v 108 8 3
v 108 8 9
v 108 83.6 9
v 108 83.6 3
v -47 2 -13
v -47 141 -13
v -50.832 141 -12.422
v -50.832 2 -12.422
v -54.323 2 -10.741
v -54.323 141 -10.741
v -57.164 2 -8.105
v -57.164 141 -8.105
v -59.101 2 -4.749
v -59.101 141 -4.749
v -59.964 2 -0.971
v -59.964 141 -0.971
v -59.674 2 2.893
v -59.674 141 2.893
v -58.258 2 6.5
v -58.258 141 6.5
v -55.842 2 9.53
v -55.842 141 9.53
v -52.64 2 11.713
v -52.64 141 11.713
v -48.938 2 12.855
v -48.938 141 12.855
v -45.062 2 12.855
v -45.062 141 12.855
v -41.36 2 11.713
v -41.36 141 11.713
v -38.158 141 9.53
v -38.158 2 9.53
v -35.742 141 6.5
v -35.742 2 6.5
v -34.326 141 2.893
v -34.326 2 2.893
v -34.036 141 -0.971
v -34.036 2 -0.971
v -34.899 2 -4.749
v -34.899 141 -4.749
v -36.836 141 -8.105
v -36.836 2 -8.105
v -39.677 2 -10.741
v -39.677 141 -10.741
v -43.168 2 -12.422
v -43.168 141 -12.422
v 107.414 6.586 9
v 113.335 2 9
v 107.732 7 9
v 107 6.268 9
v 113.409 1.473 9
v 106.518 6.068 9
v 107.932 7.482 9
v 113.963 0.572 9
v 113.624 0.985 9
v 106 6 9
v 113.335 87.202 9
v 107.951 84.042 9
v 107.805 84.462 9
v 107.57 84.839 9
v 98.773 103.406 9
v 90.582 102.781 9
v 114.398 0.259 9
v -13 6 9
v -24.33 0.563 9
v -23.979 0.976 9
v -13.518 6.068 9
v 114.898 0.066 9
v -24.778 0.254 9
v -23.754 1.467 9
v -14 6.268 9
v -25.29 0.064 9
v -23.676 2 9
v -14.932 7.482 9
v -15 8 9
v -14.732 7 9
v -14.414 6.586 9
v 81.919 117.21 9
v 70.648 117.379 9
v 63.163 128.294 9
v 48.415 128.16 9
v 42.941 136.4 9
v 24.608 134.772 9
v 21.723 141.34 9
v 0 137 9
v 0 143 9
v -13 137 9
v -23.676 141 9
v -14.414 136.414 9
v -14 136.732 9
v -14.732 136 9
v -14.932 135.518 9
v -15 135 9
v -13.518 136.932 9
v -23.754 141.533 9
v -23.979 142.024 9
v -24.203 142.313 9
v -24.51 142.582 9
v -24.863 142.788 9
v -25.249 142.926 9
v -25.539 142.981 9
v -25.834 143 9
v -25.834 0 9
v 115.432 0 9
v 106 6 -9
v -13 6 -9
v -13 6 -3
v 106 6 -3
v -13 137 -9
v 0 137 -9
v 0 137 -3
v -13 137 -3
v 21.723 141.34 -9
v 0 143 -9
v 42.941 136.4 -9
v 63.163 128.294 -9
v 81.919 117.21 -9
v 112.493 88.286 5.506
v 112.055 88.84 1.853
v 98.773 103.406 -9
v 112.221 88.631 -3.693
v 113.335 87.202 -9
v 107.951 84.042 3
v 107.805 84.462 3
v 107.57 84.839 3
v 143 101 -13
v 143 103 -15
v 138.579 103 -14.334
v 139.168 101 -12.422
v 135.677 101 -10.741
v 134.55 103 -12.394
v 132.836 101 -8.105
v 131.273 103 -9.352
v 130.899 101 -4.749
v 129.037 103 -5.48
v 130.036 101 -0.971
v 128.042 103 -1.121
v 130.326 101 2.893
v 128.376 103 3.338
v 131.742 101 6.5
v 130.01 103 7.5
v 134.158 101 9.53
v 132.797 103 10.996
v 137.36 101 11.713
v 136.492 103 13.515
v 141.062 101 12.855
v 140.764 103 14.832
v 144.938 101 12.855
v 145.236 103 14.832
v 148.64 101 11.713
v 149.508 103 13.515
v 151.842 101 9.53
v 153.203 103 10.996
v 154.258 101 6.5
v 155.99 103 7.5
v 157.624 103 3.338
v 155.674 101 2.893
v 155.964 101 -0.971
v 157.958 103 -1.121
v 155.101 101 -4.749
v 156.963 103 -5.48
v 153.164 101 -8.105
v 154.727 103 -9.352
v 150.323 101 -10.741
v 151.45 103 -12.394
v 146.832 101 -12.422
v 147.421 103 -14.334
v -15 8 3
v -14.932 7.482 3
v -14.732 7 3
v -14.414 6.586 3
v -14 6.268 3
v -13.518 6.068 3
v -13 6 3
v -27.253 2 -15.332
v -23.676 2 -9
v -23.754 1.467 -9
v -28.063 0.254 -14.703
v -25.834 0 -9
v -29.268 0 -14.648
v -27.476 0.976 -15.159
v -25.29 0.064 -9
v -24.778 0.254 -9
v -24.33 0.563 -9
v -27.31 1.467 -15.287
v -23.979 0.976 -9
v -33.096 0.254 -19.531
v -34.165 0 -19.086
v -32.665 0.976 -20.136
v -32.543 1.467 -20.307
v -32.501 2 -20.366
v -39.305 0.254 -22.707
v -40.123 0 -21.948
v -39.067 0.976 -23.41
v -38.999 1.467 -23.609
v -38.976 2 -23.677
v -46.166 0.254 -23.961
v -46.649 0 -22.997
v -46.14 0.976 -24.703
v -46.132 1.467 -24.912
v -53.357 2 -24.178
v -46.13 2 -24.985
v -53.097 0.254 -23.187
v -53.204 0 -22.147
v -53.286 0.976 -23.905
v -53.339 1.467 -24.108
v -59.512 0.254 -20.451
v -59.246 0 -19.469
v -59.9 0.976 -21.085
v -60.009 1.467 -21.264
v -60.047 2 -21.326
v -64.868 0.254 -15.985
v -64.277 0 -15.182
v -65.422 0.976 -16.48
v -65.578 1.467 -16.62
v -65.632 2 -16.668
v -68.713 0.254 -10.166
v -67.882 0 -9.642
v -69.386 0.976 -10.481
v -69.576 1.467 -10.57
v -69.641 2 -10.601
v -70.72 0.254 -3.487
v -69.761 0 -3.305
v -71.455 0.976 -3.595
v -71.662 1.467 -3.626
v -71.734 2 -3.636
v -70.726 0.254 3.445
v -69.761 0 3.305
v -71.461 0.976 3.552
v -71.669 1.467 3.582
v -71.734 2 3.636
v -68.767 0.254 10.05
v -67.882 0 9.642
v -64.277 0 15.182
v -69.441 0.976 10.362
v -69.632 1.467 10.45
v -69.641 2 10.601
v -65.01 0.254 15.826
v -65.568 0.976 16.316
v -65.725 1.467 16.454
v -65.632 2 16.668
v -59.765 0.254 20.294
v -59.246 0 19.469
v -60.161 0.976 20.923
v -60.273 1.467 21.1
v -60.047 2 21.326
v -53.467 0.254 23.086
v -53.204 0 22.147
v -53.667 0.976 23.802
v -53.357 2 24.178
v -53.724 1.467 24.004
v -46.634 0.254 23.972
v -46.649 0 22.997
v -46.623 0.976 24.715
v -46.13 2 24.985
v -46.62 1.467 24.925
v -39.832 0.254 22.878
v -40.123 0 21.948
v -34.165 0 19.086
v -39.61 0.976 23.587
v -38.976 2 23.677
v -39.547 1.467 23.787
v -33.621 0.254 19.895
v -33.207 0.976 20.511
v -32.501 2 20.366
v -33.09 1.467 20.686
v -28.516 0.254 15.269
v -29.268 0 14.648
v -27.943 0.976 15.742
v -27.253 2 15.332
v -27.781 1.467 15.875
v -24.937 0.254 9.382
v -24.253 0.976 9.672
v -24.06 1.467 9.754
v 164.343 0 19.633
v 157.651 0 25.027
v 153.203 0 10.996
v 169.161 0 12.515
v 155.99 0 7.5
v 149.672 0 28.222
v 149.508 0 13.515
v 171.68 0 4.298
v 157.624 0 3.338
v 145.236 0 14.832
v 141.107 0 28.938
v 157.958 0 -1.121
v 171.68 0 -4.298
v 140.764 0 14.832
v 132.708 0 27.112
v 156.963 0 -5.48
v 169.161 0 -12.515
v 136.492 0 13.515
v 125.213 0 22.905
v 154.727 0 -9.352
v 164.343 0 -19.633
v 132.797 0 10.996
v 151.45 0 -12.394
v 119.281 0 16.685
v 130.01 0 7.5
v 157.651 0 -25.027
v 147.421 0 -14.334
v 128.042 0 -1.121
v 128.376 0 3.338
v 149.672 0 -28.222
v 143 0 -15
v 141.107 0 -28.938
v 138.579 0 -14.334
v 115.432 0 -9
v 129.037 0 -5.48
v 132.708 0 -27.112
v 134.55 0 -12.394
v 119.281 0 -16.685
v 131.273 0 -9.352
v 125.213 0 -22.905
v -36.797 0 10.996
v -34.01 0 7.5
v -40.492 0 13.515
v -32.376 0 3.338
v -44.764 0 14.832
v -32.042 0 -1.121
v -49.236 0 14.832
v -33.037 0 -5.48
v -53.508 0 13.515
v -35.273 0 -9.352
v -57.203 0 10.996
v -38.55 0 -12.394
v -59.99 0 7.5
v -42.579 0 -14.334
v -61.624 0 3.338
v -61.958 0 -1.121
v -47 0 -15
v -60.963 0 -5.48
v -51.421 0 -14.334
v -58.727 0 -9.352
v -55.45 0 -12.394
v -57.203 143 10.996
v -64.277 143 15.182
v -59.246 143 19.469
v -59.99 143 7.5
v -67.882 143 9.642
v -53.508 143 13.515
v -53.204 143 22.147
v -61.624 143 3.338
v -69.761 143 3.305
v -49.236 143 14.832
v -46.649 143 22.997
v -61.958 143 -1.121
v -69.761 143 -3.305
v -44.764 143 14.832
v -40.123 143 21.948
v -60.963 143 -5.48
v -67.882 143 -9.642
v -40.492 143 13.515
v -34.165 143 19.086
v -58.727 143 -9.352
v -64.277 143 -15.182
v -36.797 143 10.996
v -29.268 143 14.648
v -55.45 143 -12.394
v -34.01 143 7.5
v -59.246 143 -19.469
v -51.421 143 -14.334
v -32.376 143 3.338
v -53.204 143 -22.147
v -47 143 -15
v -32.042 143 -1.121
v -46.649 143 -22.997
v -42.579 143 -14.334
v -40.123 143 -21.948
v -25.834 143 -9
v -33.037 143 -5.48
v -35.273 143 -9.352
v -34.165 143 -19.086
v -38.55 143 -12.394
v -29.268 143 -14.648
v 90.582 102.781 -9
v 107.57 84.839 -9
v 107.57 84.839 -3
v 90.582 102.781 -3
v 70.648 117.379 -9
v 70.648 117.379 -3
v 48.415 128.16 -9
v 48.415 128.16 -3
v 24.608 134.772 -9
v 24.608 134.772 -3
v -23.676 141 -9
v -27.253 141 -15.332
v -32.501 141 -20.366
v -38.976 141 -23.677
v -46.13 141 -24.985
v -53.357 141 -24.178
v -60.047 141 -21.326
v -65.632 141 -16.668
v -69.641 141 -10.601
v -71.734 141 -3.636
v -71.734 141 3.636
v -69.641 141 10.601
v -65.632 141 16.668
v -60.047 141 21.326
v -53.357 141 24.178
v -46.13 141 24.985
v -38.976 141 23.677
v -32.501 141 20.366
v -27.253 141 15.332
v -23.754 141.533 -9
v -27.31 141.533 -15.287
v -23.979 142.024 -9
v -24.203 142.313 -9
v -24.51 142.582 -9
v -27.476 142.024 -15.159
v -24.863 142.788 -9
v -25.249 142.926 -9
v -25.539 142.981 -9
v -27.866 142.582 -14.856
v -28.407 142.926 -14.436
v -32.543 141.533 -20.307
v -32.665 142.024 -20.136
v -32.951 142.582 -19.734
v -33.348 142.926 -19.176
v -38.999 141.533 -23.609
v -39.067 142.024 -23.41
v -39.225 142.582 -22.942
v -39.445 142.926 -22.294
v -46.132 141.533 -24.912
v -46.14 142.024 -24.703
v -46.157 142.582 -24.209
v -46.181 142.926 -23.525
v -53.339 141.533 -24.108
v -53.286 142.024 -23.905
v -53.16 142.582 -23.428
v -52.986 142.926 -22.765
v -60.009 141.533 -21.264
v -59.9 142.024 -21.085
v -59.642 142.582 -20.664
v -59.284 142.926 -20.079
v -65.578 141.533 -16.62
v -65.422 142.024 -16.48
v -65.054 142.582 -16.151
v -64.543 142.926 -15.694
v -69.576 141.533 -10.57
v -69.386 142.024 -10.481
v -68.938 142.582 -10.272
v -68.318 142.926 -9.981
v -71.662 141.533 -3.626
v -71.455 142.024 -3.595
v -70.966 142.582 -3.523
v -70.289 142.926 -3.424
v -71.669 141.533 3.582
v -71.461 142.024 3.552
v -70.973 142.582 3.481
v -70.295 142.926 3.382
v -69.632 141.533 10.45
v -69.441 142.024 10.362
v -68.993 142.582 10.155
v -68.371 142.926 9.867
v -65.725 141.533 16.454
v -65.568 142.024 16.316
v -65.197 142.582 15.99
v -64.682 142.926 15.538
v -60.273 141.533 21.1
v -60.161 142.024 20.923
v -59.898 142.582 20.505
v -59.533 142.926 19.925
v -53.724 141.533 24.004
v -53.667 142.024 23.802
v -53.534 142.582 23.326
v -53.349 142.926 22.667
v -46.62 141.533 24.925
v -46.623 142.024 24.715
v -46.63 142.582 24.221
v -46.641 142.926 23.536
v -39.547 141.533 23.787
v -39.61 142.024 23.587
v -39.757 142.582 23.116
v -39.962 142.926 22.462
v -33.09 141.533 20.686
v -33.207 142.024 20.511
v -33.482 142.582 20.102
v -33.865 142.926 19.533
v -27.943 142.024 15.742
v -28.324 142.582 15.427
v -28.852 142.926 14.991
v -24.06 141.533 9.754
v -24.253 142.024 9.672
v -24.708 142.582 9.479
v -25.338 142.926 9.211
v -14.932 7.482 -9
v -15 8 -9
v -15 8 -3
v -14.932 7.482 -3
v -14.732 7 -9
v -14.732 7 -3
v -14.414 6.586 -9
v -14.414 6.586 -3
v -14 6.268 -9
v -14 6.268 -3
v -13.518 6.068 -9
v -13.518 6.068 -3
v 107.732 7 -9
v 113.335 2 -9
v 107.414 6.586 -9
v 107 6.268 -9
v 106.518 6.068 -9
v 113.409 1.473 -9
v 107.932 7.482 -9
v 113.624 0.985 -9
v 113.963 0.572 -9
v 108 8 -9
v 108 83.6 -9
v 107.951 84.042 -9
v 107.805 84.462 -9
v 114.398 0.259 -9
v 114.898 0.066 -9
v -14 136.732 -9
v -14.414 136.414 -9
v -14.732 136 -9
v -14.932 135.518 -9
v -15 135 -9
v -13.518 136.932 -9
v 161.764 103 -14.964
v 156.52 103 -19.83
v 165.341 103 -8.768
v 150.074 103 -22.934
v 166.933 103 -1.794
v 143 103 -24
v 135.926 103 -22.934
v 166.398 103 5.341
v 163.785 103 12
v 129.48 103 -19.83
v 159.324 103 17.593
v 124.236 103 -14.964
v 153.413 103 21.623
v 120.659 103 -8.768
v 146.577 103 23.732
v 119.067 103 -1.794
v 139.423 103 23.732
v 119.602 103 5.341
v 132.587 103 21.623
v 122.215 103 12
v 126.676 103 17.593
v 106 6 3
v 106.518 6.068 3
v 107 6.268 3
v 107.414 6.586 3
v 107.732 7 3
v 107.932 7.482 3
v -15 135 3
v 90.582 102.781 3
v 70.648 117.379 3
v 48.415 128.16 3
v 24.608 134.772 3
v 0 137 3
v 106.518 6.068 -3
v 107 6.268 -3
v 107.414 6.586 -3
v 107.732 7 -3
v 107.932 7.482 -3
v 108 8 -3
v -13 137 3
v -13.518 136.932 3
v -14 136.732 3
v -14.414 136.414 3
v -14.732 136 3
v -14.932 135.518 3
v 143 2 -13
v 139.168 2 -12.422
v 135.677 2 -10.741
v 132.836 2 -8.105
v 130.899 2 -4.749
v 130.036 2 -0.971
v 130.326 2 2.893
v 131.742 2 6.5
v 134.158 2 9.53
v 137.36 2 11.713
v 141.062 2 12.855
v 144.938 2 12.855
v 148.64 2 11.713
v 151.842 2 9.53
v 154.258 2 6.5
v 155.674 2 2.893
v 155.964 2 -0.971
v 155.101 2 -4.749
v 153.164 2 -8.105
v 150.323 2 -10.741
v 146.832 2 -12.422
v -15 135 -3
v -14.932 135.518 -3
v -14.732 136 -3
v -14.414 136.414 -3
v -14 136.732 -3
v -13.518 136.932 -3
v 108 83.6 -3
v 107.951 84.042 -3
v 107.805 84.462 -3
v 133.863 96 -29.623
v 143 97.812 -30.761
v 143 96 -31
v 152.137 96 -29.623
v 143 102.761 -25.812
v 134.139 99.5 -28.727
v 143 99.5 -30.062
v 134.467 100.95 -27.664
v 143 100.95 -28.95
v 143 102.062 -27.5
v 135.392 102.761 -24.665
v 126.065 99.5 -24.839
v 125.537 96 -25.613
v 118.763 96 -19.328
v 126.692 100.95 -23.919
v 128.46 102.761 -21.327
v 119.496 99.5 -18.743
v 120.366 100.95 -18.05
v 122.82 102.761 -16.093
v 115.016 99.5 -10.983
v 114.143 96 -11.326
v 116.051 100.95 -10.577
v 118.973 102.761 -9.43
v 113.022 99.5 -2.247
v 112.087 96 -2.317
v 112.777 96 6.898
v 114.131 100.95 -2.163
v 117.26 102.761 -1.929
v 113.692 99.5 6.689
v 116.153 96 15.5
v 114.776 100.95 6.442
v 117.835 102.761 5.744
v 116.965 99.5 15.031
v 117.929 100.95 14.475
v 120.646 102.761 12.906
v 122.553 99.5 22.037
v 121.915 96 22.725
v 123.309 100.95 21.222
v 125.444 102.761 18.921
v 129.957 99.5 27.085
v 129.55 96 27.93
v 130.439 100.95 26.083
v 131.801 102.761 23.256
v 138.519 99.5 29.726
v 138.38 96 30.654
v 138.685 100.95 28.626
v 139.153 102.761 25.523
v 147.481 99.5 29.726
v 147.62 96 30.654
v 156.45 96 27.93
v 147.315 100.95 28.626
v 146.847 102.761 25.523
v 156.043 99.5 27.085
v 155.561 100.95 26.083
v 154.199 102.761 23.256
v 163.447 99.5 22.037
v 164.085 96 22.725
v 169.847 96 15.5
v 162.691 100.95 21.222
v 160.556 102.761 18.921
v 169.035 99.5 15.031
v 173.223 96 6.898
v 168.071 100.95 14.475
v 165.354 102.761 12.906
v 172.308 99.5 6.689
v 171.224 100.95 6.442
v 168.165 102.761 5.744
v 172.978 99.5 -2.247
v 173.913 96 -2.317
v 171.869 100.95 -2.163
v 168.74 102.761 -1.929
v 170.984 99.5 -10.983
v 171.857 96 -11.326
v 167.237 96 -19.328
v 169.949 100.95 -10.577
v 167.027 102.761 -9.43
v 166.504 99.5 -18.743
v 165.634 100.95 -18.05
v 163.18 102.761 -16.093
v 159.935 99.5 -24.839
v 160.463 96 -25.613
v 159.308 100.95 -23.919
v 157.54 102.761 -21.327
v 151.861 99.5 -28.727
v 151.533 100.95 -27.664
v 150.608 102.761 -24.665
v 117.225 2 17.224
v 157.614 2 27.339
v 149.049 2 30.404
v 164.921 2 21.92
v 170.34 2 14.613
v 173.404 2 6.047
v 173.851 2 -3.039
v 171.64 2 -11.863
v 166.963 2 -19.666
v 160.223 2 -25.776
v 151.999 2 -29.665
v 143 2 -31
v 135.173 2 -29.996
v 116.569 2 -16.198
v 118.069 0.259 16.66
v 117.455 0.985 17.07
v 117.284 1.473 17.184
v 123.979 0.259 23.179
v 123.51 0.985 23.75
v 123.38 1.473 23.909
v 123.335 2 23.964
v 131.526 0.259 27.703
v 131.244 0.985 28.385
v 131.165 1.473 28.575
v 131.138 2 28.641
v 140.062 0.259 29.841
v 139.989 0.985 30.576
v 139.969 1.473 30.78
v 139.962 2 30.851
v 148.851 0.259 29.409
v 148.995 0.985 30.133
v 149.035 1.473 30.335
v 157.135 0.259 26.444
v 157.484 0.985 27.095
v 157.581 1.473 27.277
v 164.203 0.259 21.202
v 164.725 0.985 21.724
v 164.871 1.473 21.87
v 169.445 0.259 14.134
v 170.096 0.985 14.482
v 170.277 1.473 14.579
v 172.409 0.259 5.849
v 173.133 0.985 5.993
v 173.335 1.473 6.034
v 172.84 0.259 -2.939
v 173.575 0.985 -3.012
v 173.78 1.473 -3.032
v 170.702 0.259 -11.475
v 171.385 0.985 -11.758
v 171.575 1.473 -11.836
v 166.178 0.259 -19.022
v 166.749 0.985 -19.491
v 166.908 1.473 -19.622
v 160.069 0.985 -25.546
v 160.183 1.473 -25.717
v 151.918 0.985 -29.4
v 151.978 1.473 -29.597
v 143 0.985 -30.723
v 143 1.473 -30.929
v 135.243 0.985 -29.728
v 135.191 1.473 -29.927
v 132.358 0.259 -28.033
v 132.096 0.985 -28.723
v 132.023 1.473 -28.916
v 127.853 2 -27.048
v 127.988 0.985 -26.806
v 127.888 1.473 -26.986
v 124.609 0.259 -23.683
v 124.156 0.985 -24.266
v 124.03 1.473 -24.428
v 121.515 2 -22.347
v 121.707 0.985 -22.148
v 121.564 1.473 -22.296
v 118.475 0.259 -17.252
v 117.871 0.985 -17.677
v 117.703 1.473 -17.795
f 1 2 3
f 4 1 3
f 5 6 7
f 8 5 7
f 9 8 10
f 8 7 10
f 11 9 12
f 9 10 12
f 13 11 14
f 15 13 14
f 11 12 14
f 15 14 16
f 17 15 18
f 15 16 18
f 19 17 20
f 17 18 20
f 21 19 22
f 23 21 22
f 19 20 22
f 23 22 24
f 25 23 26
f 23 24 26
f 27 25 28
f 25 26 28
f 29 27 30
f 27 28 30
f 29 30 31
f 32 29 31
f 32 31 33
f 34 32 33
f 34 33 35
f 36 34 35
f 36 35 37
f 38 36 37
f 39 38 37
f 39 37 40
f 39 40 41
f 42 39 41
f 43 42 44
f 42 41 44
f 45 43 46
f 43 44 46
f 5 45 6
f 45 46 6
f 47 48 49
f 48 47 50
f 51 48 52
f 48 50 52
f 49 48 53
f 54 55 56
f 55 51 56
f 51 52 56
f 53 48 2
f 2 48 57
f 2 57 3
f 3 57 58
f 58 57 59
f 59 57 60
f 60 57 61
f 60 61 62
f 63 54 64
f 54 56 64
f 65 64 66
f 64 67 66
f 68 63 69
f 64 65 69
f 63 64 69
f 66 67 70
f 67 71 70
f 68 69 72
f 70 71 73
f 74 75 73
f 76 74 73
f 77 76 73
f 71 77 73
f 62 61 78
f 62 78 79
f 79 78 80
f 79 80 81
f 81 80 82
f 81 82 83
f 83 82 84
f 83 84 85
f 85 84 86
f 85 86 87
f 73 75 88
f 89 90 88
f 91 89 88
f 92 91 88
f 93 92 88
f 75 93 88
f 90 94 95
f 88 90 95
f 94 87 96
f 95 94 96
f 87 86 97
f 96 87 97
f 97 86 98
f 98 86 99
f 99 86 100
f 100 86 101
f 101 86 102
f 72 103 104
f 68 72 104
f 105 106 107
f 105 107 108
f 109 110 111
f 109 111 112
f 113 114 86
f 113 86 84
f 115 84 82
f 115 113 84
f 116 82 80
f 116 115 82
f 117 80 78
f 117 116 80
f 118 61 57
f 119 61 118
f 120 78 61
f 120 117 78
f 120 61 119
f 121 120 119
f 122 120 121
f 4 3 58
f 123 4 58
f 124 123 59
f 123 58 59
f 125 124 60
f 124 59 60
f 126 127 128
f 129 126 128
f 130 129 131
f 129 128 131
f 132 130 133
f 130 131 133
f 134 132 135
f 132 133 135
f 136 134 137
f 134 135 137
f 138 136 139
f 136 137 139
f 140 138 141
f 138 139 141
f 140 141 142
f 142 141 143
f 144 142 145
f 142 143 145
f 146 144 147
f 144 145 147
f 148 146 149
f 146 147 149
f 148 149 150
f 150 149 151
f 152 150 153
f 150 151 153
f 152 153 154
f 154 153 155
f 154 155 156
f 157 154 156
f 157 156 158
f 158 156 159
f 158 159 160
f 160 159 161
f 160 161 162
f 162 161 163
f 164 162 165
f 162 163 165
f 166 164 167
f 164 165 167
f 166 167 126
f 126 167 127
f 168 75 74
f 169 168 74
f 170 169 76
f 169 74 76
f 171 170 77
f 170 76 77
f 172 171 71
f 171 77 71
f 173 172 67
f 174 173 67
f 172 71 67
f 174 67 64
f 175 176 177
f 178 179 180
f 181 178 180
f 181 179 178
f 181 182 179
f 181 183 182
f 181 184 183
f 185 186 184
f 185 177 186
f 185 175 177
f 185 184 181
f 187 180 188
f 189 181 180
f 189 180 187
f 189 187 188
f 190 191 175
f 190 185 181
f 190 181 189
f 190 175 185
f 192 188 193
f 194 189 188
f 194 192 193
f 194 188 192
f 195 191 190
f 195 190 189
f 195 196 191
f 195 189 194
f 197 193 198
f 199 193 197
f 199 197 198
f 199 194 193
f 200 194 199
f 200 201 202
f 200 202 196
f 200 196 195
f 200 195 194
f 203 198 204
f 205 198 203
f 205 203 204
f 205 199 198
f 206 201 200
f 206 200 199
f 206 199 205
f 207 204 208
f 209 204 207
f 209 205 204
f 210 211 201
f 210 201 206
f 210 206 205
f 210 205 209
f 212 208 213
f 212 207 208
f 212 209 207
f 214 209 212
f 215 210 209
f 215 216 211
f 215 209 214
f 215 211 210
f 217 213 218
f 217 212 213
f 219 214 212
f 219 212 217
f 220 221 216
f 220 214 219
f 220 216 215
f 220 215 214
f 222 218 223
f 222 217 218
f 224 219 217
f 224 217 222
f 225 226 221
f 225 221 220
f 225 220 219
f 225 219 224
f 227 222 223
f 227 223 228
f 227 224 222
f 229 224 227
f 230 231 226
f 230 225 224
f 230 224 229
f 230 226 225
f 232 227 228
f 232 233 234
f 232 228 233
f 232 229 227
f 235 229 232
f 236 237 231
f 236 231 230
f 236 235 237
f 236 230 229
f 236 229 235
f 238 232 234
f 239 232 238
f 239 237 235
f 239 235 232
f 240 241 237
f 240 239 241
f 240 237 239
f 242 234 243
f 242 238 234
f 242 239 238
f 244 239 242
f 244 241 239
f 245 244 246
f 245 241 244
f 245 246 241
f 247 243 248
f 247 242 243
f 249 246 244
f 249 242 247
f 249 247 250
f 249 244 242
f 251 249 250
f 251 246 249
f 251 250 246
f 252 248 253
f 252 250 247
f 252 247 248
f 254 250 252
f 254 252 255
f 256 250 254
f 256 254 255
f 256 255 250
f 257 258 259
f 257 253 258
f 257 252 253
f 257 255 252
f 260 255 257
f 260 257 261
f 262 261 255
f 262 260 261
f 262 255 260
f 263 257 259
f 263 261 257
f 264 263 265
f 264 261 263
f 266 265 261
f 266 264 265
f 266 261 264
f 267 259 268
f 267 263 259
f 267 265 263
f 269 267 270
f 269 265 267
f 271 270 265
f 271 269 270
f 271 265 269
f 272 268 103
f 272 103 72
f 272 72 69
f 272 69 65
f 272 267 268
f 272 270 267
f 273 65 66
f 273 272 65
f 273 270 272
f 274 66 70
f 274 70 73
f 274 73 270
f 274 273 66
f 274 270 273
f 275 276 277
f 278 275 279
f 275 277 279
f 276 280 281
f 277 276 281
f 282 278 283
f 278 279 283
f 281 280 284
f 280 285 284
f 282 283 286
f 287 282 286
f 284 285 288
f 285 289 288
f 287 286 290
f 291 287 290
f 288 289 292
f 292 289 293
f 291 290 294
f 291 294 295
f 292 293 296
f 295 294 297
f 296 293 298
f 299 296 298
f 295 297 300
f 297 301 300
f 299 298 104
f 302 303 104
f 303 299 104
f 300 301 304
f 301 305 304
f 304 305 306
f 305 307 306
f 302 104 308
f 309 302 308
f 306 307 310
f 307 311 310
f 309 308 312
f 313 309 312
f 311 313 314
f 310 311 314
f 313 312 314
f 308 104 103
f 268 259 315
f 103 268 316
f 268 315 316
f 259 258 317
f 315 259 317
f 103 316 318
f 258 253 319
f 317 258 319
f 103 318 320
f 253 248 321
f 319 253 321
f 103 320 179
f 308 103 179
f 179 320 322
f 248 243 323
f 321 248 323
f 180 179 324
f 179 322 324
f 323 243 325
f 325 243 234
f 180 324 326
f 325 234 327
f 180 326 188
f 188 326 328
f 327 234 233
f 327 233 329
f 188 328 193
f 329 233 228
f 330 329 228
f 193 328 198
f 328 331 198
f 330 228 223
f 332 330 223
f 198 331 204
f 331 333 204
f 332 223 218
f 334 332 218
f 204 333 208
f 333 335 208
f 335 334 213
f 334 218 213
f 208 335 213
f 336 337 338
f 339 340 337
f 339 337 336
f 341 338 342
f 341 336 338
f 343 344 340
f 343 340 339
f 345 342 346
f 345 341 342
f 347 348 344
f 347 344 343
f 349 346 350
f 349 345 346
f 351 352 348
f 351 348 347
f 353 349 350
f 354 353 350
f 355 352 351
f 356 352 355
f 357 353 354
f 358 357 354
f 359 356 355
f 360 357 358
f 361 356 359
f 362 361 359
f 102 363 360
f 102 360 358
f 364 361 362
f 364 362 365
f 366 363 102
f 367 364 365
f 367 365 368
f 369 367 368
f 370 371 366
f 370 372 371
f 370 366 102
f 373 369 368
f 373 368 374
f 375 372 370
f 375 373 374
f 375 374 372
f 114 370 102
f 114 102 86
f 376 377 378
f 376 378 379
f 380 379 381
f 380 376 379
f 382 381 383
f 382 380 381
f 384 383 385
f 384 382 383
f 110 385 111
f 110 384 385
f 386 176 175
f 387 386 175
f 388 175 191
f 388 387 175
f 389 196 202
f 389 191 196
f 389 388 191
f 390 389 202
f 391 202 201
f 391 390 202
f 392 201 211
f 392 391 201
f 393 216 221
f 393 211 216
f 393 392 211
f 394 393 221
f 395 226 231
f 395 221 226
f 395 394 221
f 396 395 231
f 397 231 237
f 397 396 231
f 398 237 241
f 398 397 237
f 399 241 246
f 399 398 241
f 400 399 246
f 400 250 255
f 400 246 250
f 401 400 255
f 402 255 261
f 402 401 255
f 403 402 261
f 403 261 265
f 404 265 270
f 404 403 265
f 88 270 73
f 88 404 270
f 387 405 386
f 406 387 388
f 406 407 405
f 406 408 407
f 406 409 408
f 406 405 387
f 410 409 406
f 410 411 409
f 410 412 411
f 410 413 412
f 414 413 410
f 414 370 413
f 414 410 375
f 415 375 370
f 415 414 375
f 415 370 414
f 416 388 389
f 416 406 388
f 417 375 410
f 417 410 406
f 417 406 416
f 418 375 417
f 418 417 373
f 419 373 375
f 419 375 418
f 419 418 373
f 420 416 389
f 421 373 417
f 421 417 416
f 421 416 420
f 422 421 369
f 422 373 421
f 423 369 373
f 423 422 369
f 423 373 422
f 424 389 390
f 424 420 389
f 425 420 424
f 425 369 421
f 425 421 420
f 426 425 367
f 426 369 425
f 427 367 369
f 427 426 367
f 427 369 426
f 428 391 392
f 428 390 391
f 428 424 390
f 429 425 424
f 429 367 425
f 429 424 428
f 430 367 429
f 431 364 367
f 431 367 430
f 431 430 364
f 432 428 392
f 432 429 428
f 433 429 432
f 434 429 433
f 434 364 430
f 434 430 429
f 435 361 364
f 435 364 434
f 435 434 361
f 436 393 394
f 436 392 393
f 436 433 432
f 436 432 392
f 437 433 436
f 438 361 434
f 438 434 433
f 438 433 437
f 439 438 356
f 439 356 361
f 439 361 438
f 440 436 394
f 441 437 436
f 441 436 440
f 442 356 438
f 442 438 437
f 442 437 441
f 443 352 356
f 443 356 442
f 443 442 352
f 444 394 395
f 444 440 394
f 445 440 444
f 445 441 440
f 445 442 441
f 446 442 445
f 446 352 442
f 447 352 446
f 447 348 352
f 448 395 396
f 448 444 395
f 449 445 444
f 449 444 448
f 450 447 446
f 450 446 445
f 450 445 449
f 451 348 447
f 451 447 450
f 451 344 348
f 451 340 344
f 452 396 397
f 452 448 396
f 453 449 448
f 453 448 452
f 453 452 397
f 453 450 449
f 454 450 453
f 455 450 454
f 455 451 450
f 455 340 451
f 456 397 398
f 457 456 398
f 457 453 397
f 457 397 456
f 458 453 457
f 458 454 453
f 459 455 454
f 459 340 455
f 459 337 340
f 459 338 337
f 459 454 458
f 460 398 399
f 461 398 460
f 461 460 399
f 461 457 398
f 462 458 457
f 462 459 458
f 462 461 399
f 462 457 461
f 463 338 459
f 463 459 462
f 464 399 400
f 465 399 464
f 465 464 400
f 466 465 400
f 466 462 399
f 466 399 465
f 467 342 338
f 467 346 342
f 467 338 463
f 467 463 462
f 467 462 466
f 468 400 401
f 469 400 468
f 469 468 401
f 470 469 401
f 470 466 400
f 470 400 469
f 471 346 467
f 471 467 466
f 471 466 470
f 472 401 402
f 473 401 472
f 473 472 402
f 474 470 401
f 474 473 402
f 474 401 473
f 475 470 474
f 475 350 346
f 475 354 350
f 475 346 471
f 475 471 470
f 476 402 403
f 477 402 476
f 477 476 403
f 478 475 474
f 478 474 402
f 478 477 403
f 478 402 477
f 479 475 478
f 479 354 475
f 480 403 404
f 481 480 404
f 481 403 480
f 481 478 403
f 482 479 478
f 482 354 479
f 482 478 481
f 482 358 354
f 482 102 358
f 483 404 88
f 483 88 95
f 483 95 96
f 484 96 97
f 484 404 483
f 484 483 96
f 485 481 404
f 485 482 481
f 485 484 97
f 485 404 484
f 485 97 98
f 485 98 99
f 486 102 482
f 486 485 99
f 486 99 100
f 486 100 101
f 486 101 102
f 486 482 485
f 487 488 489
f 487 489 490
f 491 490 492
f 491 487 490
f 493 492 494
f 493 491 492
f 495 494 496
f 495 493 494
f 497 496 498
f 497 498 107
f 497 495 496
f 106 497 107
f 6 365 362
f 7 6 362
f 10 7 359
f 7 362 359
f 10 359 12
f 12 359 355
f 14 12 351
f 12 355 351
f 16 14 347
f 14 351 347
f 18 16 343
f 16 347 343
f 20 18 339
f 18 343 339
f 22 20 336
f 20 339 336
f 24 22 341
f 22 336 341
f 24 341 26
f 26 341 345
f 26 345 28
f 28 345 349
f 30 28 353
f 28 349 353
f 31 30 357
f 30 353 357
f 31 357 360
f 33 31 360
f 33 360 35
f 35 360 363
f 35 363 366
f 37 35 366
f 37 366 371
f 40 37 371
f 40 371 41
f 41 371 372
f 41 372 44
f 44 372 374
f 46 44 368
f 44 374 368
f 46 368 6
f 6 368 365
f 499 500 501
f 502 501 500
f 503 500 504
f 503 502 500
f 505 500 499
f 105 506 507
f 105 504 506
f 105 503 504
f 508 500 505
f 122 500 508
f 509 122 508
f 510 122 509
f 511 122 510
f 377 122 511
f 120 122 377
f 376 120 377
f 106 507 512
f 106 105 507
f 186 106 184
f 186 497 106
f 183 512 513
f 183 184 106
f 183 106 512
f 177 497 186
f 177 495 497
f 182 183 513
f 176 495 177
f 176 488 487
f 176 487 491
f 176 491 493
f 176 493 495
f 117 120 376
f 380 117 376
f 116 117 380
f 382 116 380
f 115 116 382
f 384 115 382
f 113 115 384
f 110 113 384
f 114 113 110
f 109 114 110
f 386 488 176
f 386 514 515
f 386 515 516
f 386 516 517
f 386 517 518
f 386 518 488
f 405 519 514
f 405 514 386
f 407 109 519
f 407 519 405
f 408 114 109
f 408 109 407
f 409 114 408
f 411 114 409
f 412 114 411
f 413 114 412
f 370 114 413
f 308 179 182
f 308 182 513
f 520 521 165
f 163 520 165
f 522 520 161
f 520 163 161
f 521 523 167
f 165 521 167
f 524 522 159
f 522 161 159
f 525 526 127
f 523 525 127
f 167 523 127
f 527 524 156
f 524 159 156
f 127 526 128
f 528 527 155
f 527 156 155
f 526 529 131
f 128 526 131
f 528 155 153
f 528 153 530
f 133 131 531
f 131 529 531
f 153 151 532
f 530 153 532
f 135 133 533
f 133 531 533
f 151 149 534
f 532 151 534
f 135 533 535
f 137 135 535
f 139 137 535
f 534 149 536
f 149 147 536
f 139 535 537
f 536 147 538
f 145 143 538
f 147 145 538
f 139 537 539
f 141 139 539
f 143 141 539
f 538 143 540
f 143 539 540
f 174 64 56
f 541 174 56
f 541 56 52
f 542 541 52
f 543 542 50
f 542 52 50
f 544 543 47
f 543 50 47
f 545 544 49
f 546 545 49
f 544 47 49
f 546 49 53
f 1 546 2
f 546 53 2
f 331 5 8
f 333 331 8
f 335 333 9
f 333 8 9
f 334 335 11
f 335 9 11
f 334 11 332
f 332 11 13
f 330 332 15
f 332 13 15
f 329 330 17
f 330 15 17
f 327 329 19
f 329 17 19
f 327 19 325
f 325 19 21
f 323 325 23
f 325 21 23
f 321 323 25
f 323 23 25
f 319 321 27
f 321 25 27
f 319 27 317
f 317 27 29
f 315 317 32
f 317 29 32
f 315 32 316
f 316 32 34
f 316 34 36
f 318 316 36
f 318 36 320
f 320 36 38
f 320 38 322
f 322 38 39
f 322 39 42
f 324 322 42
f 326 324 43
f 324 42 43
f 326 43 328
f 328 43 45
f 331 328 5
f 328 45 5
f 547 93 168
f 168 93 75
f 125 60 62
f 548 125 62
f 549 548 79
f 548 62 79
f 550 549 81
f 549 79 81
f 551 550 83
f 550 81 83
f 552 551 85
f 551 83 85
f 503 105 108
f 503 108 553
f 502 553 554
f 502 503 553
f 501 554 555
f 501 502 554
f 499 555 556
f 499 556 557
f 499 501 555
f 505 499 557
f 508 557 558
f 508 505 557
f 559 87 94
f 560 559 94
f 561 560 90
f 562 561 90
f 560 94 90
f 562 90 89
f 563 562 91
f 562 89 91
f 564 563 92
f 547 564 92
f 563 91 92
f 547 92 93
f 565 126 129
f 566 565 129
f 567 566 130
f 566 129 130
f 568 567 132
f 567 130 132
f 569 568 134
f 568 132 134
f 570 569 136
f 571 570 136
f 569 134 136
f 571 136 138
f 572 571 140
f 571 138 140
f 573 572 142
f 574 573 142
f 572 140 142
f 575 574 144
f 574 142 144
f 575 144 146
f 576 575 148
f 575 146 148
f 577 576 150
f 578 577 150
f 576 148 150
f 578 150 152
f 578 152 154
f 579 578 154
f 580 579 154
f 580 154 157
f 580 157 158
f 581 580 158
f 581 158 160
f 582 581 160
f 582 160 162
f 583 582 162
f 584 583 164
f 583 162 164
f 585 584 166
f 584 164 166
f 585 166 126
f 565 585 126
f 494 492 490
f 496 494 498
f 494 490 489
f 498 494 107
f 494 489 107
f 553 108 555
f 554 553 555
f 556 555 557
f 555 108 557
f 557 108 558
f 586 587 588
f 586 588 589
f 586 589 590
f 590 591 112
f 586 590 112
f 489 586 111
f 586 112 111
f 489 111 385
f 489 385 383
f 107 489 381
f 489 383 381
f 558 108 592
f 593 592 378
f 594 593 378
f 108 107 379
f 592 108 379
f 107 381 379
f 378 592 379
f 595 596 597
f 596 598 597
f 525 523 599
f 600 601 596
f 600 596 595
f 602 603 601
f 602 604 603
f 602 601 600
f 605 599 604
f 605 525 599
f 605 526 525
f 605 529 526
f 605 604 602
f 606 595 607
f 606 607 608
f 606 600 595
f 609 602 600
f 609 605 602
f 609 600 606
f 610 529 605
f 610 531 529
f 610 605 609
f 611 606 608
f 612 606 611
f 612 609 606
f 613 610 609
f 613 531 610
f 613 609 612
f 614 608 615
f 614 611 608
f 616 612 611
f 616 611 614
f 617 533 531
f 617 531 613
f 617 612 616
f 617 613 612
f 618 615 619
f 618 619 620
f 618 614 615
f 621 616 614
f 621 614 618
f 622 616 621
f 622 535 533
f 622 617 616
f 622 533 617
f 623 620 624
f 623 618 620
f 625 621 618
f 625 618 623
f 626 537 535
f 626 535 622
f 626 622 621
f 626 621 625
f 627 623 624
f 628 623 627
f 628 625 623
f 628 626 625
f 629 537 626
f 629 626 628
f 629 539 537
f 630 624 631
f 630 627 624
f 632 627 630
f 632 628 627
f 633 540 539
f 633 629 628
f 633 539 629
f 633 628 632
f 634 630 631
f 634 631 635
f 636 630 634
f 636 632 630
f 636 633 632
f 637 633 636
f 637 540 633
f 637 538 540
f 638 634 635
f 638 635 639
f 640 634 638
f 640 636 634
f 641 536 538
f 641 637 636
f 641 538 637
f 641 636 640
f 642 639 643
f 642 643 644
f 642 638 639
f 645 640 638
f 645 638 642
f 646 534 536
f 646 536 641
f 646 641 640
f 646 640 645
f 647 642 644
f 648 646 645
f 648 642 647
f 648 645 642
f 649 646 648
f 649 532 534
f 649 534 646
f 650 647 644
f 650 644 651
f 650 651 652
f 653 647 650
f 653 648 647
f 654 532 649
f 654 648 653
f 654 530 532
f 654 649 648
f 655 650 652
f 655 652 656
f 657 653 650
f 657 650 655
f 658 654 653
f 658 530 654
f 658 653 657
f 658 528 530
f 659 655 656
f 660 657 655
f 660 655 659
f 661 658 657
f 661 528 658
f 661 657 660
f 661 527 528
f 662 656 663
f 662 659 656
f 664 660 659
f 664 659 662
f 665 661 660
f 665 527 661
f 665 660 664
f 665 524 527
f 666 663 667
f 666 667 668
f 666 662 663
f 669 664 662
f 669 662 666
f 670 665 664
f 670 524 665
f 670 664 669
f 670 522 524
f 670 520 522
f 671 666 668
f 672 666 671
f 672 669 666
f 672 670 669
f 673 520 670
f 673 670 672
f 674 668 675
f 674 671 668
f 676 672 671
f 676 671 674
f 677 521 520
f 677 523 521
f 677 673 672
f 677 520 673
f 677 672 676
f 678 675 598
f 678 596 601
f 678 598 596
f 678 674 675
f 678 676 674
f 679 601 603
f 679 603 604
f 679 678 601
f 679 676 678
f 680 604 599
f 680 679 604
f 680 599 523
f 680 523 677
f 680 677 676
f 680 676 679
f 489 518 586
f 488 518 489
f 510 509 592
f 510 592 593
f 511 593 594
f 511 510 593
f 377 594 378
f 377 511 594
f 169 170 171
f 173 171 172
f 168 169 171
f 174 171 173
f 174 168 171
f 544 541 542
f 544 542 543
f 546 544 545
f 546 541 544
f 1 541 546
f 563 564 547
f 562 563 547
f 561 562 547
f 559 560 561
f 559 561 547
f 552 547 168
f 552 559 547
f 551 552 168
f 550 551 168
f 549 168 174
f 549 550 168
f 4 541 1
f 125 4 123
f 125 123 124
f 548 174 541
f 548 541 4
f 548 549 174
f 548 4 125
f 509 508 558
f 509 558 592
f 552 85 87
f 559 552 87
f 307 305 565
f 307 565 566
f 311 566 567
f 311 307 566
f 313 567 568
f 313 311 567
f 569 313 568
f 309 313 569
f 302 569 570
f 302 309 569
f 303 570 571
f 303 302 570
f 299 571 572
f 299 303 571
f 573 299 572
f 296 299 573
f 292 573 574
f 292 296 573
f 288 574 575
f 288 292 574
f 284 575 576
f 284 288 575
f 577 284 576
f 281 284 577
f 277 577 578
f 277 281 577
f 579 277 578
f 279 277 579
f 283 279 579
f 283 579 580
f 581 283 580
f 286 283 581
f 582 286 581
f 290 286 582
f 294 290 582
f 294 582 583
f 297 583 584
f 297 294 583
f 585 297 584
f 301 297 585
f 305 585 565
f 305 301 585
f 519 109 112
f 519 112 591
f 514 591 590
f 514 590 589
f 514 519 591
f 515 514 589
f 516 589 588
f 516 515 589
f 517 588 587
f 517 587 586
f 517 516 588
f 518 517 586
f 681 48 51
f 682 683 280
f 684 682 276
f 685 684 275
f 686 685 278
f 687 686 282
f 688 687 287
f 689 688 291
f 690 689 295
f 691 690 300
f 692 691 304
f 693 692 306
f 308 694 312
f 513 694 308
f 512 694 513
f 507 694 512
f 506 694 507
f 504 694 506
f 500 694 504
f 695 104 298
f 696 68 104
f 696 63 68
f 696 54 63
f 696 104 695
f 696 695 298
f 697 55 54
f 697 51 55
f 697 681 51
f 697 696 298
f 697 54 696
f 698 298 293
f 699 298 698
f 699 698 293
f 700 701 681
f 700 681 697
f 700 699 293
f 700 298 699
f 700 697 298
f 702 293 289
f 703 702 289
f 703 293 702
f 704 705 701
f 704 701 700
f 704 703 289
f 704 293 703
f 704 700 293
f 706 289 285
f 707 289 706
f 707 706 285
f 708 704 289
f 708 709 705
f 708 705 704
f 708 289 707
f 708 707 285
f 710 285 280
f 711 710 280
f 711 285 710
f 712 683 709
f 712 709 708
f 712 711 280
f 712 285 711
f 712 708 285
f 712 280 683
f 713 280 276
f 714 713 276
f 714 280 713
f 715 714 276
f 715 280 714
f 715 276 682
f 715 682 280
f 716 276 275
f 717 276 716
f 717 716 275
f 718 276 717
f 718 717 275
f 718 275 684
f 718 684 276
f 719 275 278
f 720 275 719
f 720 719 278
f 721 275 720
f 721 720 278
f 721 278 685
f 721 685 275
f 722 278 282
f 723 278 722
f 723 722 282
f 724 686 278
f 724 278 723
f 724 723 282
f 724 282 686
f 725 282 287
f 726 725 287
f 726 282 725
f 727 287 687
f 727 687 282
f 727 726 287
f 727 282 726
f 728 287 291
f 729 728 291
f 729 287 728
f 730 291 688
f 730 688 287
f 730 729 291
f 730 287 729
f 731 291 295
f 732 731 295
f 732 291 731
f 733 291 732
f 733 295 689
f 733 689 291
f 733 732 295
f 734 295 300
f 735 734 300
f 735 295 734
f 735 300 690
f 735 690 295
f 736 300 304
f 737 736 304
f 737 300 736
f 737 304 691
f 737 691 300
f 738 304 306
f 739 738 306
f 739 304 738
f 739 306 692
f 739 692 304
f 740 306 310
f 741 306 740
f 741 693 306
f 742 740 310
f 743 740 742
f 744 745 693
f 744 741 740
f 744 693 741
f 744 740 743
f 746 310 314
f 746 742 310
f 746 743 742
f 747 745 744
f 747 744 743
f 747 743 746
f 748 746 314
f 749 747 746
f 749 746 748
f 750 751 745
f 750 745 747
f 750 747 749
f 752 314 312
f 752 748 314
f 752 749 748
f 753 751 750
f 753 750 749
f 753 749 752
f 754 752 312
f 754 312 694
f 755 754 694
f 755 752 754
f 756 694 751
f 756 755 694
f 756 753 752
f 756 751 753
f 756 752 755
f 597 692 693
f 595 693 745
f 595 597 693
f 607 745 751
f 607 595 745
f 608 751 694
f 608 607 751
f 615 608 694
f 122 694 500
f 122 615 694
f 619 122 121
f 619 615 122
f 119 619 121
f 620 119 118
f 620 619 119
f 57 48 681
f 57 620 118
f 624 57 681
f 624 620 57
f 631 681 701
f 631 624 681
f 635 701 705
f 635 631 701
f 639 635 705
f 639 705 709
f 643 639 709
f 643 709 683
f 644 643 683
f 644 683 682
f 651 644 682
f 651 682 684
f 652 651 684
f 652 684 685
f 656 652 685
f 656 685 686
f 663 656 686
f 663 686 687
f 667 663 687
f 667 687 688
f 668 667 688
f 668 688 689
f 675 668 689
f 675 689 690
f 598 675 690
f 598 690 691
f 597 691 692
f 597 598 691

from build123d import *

# Parameters (mm, degrees)
SKETCH1_W                = 18
SKETCH1_H                = 103
SKETCH3_W                = 12
SKETCH3_H                = 143
CHAMFER1_SIZE            = 2
CHAMFER2_SIZE            = 2
FILLET1_R                = 2
FILLET2_R                = 2
FILLET3_R                = 7
BOSS_EXTRUDE1_DEPTH      = 9
BOSS_EXTRUDE1_DEPTH_BACK = 9
CUT_EXTRUDE1_DEPTH       = 6


with BuildPart() as part:
    # Sketch1 → Revolve2 (revolve)
    with BuildSketch(Plane.XY):
        with Locations((165, 51.5)):
            Rectangle(SKETCH1_W, SKETCH1_H)
    revolve(axis=Axis((143, 0, 0), (0, 1, 0)))

    # Chamfer2
    chamfer2_edges = [part.edges().sort_by_distance(p)[0] for p in [
        (130, 103, 0),
        (130, 0, 0),
    ]]
    chamfer(chamfer2_edges, length=CHAMFER2_SIZE)

    # Fillet2
    fillet2_edges = [part.edges().sort_by_distance(p)[0] for p in [
        (112, 0, 0),
    ]]
    fillet(fillet2_edges, radius=FILLET2_R)

    # Fillet3
    fillet3_edges = [part.edges().sort_by_distance(p)[0] for p in [
        (112, 103, 0),
    ]]
    fillet(fillet3_edges, radius=FILLET3_R)



with BuildPart() as body_2:
    # Sketch3 → Revolve3 (revolve)
    with BuildSketch(Plane.XY):
        with Locations((-66, 71.5)):
            Rectangle(SKETCH3_W, SKETCH3_H)
    revolve(axis=Axis((-47, 0, 0), (0, 1, 0)))

    # Chamfer1
    chamfer1_edges = [body_2.edges().sort_by_distance(p)[0] for p in [
        (-34, 0, 0),
        (-34, 143, 0),
    ]]
    chamfer(chamfer1_edges, length=CHAMFER1_SIZE)

    # Fillet1
    fillet1_edges = [body_2.edges().sort_by_distance(p)[0] for p in [
        (-22, 143, 0),
        (-22, 0, 0),
    ]]
    fillet(fillet1_edges, radius=FILLET1_R)


with BuildPart() as part_1:
    add(part.part)

    add(body_2.part)  # Boss-Extrude1 merges body 2
    # Sketch4 → Boss-Extrude1 (add, two sides: drawn at the far end of the back side and taken through both)
    with BuildSketch(Plane.XY.offset(-BOSS_EXTRUDE1_DEPTH_BACK)):
        with BuildLine():
            Line((0, 0), (-27.193276933, 0))
            Line((-27.193276933, 0), (-27.193276933, 143))
            Line((-27.193276933, 143), (0, 143))
            ThreePointArc((0, 143), (69.368060127, 125.048279613), (121.319672434, 75.700310967))
            Line((121.319672434, 75.700310967), (121.319672434, 0))
            Line((121.319672434, 0), (0, 0))
        make_face()
    extrude(amount=BOSS_EXTRUDE1_DEPTH + BOSS_EXTRUDE1_DEPTH_BACK)

    # Sketch6 → Cut-Extrude1 (cut)
    with BuildSketch(Plane.XY.offset(9)):
        with BuildLine():
            Line((0, 137), (-13, 137))
            ThreePointArc((-13, 137), (-14.414213562, 136.414213562), (-15, 135))
            Line((-15, 135), (-15, 8))
            ThreePointArc((-15, 8), (-14.414213562, 6.585786438), (-13, 6))
            Line((-13, 6), (106, 6))
            ThreePointArc((106, 6), (107.414213562, 6.585786438), (108, 8))
            Line((108, 8), (108, 83.600239234))
            ThreePointArc((108, 83.600239234), (107.889542371, 84.255700621), (107.57037037, 84.838761297))
            ThreePointArc((107.57037037, 84.838761297), (59.774951704, 123.27187493), (0, 137))
        make_face()
    cut_extrude1 = extrude(amount=-CUT_EXTRUDE1_DEPTH, mode=Mode.SUBTRACT)

    # Mirror1: Cut-Extrude1 across plane
    add(cut_extrude1.mirror(Plane.XY), mode=Mode.SUBTRACT)


solid = part_1.part
